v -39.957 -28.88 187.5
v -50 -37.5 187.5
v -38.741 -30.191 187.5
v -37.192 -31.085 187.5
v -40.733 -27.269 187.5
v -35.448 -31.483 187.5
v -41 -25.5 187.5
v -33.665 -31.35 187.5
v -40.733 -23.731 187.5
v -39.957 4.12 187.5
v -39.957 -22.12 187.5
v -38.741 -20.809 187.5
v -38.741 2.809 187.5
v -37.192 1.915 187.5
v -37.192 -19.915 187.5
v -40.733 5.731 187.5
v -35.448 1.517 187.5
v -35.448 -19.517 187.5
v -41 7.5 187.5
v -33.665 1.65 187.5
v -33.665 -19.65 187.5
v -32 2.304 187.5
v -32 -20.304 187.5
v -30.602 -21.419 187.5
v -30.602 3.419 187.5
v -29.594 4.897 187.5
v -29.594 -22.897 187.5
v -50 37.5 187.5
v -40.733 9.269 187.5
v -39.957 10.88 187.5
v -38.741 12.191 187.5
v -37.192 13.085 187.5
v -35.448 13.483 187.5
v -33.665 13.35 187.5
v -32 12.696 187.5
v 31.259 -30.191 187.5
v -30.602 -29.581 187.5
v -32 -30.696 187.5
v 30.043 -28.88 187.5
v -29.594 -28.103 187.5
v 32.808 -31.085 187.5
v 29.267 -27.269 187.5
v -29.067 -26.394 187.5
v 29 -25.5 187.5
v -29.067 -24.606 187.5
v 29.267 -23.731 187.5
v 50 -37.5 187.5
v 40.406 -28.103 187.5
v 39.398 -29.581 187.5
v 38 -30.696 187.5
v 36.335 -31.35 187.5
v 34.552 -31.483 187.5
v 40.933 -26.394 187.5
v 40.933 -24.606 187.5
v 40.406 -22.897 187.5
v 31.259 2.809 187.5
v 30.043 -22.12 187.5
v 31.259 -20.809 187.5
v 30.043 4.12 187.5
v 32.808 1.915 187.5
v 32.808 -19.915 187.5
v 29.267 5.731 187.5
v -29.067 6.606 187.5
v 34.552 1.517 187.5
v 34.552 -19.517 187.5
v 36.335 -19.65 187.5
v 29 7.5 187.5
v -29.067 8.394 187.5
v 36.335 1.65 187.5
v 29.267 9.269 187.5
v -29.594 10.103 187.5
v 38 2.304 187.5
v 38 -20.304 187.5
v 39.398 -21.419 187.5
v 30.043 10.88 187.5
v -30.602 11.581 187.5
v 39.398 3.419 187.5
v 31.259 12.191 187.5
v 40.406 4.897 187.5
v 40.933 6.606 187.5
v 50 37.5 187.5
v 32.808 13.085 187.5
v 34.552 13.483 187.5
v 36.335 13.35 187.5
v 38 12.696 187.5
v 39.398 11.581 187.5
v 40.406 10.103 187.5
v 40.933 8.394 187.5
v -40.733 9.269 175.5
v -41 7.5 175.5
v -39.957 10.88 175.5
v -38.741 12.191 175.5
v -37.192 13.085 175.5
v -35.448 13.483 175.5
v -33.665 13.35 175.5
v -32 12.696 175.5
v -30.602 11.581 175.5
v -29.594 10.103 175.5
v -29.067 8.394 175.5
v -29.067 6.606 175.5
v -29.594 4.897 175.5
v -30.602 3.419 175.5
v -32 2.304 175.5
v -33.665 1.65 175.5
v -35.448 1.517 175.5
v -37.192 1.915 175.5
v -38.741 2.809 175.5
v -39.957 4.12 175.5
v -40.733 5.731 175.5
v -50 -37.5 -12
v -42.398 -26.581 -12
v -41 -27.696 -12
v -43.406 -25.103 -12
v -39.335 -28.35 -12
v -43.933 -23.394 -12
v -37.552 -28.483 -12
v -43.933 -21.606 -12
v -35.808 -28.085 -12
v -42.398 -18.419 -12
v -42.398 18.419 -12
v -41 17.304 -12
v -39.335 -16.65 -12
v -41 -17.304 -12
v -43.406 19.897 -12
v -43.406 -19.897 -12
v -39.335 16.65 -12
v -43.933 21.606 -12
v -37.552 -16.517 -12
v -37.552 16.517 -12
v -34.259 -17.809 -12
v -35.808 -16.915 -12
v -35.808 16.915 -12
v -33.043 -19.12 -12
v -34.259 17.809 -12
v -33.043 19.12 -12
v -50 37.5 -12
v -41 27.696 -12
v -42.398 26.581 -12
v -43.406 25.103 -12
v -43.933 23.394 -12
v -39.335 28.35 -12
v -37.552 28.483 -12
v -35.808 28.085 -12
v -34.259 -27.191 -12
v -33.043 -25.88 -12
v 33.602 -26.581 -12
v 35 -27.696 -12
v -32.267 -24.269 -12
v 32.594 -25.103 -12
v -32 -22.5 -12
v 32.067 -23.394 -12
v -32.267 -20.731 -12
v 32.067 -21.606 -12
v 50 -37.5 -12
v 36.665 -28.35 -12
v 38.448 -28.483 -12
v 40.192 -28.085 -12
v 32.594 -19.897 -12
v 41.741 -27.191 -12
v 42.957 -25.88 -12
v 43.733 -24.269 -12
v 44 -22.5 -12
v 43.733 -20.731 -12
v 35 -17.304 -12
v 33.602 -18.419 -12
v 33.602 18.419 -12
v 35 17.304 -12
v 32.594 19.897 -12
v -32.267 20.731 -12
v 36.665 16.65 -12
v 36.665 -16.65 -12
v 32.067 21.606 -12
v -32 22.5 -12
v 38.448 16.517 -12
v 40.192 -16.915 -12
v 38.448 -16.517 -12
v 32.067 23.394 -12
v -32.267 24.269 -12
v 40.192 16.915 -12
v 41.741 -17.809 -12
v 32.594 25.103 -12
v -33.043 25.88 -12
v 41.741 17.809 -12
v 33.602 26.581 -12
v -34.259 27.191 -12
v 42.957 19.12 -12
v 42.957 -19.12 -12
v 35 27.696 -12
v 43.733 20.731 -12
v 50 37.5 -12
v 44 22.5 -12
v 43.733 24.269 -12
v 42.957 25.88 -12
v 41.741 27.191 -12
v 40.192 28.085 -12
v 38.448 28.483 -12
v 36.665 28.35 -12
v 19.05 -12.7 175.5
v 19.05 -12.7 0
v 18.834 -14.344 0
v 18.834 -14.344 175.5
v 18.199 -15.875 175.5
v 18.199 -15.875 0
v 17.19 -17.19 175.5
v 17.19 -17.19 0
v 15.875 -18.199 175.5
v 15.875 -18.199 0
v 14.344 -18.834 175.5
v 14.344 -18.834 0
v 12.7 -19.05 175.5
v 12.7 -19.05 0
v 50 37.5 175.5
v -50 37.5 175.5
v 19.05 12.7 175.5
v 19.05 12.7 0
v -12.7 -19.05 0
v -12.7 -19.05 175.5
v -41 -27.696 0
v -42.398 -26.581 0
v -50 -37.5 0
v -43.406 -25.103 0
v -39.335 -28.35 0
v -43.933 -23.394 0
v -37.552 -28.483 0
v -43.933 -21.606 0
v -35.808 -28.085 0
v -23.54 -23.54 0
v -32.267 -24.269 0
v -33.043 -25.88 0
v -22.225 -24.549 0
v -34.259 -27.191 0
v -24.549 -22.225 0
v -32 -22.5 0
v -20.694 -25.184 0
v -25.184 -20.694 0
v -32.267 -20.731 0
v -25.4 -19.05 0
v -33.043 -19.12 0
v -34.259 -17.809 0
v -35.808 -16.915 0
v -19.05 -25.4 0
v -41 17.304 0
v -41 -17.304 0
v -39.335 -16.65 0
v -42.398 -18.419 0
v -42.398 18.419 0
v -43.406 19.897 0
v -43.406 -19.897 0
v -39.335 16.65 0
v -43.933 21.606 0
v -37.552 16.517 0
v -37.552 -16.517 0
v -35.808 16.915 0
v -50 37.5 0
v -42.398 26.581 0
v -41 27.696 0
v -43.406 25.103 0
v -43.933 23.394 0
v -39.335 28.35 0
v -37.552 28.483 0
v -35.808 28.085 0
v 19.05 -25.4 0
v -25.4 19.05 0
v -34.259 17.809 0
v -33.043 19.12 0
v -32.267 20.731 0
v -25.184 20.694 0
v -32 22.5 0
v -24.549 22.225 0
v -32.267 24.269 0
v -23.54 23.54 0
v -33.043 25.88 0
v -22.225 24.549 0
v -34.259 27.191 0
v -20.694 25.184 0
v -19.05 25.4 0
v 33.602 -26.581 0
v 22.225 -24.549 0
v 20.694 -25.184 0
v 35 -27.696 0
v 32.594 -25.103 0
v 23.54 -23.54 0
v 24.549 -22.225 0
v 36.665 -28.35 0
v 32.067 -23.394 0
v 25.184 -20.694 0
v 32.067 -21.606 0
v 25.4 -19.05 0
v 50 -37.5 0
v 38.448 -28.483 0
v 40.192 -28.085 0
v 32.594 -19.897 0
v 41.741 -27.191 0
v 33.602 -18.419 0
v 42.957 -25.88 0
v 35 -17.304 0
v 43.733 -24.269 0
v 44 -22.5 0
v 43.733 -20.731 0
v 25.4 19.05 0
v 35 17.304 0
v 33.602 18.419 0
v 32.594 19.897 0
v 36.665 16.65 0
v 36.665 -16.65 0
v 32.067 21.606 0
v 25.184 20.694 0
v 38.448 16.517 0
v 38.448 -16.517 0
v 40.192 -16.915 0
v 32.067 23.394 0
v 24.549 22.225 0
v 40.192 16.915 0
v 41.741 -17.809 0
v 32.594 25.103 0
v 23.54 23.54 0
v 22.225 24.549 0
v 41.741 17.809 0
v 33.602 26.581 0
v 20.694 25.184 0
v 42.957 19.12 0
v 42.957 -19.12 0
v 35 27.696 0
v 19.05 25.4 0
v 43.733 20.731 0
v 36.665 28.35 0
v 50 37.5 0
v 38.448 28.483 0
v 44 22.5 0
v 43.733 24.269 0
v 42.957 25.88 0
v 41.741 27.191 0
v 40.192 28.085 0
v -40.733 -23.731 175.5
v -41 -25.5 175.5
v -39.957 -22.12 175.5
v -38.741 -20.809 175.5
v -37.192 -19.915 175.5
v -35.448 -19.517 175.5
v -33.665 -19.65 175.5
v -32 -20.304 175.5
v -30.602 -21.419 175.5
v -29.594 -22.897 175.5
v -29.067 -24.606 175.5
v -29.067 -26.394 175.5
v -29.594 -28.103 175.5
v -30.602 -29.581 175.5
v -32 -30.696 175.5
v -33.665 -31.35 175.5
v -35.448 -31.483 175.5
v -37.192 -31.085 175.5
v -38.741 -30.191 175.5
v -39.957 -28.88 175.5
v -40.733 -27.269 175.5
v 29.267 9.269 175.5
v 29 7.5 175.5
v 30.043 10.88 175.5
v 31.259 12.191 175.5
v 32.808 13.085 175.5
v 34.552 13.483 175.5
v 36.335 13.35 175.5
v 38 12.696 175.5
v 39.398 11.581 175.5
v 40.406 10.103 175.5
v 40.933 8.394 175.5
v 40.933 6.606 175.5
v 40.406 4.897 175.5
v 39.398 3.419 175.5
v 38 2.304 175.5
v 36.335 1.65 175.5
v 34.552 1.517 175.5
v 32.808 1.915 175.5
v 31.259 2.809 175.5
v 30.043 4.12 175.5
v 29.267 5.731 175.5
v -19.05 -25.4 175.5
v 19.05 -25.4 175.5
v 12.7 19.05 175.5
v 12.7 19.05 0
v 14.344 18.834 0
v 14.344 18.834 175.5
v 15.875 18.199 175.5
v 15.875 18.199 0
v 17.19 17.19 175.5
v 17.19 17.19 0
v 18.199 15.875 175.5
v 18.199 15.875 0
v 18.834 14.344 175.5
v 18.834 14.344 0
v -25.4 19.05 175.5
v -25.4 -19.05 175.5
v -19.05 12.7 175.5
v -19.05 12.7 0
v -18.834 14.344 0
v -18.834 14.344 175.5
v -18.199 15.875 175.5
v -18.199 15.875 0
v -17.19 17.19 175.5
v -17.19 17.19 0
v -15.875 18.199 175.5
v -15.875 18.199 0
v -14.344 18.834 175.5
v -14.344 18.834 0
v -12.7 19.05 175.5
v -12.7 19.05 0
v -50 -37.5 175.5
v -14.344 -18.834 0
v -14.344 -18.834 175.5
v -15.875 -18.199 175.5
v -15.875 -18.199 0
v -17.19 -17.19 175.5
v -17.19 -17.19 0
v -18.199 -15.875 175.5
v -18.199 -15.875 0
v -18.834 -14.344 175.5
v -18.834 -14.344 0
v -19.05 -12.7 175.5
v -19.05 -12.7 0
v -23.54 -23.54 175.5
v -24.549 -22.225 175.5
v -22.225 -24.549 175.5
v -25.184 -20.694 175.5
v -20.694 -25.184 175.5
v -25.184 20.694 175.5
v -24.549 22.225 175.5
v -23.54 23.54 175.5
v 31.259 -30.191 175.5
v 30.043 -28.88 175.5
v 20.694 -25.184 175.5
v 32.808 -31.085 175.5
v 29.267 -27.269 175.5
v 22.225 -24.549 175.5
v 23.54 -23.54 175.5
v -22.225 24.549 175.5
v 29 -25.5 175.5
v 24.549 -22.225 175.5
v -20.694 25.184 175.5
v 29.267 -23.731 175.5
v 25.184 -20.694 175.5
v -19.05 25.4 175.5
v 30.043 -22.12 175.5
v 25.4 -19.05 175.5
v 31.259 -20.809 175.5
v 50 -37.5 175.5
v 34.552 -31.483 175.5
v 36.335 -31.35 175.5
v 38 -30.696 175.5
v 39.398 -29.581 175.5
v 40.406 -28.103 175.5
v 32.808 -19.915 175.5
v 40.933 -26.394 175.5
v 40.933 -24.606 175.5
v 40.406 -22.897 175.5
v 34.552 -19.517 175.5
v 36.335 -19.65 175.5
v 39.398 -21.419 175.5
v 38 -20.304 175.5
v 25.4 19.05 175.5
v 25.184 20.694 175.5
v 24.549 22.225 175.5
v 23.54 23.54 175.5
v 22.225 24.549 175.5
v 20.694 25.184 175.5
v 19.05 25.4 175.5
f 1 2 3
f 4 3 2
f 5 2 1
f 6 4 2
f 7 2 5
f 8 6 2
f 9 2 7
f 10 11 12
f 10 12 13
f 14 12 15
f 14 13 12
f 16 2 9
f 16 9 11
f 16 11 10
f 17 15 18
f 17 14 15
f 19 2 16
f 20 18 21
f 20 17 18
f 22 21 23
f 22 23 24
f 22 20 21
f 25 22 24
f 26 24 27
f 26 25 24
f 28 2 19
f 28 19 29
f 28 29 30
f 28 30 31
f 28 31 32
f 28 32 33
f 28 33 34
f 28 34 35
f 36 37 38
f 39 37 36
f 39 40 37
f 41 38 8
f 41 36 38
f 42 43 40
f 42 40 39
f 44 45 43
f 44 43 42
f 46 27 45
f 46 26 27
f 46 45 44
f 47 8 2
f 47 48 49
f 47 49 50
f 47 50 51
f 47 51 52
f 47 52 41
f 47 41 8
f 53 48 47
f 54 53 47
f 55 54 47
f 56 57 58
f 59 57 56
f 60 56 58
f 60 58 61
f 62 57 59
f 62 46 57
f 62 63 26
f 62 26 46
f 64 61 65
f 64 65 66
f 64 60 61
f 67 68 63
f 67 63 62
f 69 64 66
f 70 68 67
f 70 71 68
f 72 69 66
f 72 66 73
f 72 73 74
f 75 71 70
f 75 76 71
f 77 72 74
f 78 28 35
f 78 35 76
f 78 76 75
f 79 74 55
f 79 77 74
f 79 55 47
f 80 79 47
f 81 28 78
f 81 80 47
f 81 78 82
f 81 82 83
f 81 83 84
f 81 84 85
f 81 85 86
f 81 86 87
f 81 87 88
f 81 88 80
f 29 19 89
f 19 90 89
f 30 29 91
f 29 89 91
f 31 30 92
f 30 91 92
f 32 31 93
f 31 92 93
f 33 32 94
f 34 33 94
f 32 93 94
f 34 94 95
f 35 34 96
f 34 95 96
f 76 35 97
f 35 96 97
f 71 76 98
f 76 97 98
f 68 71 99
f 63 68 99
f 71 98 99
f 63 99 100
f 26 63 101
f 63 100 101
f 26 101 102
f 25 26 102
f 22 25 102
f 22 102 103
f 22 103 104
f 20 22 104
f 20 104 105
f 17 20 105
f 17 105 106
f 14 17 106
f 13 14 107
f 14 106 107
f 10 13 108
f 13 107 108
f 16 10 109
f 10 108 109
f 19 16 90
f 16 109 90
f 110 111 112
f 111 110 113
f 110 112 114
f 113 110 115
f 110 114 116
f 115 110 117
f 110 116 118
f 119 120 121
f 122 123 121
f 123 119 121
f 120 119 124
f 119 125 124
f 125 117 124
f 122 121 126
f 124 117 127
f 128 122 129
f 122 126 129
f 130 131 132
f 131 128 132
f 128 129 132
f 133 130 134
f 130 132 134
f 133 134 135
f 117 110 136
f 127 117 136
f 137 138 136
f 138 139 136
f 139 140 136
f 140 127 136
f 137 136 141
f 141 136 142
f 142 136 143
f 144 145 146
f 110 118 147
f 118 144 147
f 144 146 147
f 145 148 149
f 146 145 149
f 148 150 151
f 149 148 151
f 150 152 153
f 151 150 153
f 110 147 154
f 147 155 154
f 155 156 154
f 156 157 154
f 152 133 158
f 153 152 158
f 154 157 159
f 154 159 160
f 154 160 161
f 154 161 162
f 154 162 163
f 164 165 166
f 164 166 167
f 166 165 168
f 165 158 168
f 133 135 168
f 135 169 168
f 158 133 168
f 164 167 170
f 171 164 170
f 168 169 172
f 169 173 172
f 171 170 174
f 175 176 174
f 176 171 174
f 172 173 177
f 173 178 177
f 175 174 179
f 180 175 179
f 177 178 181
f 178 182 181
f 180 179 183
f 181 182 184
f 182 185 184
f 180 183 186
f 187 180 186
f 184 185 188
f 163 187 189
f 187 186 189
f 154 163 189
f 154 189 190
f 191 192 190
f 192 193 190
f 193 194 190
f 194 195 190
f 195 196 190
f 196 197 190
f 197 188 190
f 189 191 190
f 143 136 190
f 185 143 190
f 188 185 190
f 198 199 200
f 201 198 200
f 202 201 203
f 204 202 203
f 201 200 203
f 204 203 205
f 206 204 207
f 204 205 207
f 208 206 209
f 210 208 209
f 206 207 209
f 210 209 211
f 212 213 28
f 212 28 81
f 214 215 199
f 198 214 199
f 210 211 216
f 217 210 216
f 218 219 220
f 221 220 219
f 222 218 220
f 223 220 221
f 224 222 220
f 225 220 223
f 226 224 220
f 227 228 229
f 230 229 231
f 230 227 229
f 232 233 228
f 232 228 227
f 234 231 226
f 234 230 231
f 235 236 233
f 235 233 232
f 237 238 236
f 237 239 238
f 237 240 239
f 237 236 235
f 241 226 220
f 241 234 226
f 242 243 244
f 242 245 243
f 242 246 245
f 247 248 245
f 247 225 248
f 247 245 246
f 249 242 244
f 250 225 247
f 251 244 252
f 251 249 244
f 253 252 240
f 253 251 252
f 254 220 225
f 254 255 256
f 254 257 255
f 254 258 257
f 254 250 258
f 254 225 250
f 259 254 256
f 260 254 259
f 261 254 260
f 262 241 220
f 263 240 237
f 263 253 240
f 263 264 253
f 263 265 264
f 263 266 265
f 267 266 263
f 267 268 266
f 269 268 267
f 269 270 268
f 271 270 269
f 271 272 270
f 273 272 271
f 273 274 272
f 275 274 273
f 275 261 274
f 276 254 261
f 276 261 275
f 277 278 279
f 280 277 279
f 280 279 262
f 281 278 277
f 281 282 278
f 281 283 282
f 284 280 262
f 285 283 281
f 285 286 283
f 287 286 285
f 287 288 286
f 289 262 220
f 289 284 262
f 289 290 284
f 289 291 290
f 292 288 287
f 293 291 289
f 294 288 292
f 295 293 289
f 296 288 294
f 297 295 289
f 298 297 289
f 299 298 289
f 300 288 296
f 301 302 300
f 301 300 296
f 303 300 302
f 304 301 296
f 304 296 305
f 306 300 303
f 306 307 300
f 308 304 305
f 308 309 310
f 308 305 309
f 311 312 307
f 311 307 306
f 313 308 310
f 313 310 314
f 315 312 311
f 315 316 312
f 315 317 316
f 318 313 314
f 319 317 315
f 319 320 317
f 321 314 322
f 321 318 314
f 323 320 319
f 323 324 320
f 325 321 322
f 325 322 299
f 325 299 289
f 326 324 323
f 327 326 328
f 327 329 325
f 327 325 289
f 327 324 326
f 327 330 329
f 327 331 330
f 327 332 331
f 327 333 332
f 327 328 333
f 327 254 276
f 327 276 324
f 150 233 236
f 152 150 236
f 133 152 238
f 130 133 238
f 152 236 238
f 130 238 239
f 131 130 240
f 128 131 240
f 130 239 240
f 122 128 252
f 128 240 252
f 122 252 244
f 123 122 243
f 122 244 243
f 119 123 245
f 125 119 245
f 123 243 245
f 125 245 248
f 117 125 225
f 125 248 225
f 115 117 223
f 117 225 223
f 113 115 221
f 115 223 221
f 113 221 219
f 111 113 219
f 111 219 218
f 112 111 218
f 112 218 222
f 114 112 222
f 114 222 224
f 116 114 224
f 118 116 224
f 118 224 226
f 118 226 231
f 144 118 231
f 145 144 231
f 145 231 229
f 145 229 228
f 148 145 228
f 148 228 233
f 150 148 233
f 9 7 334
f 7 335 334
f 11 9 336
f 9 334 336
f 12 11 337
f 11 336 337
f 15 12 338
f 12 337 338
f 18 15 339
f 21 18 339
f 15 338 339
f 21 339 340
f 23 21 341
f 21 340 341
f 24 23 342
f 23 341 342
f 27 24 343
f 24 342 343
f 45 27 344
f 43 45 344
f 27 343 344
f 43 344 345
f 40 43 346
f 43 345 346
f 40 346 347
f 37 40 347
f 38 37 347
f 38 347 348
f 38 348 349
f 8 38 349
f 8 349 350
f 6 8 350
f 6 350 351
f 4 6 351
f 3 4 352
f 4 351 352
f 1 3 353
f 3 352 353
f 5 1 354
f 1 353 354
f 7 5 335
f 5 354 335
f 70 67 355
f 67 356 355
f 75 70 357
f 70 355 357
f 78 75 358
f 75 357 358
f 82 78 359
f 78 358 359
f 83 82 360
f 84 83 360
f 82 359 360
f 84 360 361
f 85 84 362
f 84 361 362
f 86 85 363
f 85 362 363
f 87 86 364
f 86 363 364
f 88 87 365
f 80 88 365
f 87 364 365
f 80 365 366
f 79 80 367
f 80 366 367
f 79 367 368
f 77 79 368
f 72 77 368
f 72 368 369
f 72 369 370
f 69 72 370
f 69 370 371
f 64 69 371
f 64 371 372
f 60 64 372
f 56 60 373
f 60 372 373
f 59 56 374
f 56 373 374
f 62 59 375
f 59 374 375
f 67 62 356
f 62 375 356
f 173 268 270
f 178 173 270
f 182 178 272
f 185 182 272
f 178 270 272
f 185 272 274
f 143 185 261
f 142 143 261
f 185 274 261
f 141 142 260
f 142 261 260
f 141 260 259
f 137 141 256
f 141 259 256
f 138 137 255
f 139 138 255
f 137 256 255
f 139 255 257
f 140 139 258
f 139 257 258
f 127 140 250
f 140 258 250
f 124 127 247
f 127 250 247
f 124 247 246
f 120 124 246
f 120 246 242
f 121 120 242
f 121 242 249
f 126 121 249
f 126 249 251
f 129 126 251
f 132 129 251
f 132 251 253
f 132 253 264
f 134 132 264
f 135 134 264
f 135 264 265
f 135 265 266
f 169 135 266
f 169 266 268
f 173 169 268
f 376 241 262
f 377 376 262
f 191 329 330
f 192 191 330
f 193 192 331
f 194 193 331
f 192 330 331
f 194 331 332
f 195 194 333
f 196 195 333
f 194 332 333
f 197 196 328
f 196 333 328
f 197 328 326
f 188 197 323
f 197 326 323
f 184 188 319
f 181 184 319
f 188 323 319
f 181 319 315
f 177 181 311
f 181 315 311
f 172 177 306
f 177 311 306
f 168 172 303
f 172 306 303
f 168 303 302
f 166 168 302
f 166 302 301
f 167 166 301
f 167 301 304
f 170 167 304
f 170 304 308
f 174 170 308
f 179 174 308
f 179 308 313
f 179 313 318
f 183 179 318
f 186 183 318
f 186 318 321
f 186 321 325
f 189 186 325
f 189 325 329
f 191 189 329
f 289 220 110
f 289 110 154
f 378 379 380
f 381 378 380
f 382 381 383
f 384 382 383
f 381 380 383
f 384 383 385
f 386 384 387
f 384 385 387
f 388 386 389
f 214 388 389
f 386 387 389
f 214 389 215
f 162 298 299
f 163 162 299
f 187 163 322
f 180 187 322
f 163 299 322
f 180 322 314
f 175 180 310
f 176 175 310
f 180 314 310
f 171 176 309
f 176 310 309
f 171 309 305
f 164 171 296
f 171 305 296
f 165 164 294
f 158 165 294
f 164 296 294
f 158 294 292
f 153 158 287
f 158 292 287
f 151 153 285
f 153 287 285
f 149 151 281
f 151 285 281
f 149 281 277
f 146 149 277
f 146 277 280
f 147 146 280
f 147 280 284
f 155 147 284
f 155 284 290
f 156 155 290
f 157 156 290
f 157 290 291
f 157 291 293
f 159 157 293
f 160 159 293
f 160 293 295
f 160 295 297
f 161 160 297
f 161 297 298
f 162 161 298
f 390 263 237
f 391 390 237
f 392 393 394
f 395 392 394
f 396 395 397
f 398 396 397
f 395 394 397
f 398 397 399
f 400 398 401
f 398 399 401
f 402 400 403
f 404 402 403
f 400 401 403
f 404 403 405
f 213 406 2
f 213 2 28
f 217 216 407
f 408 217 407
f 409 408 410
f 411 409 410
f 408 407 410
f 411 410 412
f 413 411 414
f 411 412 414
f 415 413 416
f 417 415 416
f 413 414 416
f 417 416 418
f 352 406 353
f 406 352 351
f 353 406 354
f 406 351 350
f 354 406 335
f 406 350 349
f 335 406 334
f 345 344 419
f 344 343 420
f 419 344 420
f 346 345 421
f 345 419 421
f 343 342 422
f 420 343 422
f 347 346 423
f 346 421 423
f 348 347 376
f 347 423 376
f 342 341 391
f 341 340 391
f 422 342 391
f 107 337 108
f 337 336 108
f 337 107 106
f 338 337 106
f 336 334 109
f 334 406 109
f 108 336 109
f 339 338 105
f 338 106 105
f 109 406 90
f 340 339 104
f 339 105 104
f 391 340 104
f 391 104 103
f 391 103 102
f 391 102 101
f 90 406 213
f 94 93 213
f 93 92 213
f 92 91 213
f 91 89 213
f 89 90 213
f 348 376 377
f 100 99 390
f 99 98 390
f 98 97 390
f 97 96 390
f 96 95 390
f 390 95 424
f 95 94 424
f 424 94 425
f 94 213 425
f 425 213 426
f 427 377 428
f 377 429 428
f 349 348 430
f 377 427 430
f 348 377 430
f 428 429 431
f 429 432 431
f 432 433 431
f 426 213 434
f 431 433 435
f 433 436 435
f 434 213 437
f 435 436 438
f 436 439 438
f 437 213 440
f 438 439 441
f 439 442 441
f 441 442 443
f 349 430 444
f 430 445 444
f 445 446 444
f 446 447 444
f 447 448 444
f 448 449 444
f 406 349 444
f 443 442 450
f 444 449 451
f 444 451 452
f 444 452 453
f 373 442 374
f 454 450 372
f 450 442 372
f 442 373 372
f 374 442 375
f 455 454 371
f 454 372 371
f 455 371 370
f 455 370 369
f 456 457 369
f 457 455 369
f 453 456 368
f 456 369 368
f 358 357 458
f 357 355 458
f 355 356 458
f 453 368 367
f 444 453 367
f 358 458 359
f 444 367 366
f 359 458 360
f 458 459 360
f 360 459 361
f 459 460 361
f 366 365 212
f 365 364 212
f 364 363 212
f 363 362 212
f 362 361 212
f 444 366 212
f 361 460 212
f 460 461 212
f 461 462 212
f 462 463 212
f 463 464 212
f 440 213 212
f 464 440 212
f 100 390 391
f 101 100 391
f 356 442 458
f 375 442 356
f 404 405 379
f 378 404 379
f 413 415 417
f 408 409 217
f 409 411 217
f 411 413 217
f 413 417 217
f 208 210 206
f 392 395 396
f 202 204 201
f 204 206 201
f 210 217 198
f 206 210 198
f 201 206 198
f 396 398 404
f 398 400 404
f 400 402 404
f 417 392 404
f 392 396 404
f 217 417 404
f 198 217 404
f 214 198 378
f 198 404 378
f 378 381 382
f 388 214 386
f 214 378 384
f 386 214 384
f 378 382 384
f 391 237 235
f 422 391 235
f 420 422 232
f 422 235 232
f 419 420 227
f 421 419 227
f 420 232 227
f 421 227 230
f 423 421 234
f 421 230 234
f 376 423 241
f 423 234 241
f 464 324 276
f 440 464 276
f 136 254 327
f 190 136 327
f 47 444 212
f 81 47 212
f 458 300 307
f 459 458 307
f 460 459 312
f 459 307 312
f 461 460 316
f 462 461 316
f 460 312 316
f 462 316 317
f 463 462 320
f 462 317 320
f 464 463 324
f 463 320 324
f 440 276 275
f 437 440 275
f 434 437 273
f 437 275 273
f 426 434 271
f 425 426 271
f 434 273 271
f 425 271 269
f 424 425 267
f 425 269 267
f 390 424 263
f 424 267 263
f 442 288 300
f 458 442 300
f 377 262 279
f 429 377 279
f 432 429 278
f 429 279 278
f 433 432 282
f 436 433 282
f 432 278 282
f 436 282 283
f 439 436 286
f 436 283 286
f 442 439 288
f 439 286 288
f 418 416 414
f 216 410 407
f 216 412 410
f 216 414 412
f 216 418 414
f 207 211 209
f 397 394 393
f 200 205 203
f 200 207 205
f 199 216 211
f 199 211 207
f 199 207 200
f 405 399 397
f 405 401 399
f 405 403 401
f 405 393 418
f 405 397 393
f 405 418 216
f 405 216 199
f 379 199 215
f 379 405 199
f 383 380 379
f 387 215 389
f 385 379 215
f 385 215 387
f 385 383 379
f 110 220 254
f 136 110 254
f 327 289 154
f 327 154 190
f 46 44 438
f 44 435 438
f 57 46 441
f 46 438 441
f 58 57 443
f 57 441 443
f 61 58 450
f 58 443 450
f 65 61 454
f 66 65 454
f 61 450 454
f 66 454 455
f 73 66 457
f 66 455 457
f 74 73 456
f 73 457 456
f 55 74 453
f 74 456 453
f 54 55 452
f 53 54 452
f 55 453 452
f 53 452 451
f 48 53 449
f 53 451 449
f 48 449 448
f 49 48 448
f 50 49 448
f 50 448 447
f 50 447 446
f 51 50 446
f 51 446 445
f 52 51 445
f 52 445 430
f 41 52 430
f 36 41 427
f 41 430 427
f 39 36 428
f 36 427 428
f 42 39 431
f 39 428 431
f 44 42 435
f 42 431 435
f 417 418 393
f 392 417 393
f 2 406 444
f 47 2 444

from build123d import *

# Parameters (mm, degrees)
F0_W     = 100
F0_H     = 75
F1_DEPTH = 12
F3_DEPTH = 175.5
F5_W     = 100
F5_H     = 75
F6_DEPTH = 12
F7_D     = 12
F7_DEPTH = 12.001
F9_D     = 12
F9_DEPTH = 12
F9_TIP   = 3.6051637142


with BuildPart() as f1:
    # F0 (on Top) → F1 (new body)
    with BuildSketch(Plane.XY):
        Rectangle(F0_W, F0_H)
    extrude(amount=-F1_DEPTH)

    # F2 (on face) → F3 (join)
    with BuildSketch(Plane.XY):
        with BuildLine():
            Line((-19.05, -25.4), (19.05, -25.4))
            ThreePointArc((19.05, -25.4), (23.5401280605, -23.5401280605), (25.4, -19.05))
            Line((25.4, -19.05), (25.4, 19.05))
            ThreePointArc((25.4, 19.05), (23.5401280605, 23.5401280605), (19.05, 25.4))
            Line((19.05, 25.4), (-19.05, 25.4))
            ThreePointArc((-19.05, 25.4), (-23.5401280605, 23.5401280605), (-25.4, 19.05))
            Line((-25.4, 19.05), (-25.4, -19.05))
            ThreePointArc((-25.4, -19.05), (-23.5401280605, -23.5401280605), (-19.05, -25.4))
        make_face()
        with BuildLine():
            Line((-12.7, 19.05), (12.7, 19.05))
            ThreePointArc((12.7, 19.05), (17.1901280605, 17.1901280605), (19.05, 12.7))
            Line((19.05, 12.7), (19.05, -12.7))
            ThreePointArc((19.05, -12.7), (17.1901280605, -17.1901280605), (12.7, -19.05))
            Line((12.7, -19.05), (-12.7, -19.05))
            ThreePointArc((-12.7, -19.05), (-17.1901280605, -17.1901280605), (-19.05, -12.7))
            Line((-19.05, -12.7), (-19.05, 12.7))
            ThreePointArc((-19.05, 12.7), (-17.1901280605, 17.1901280605), (-12.7, 19.05))
        make_face(mode=Mode.SUBTRACT)
    extrude(amount=F3_DEPTH)

    # F5 (on face) → F6 (join)
    with BuildSketch(Plane.XY.offset(175.5)):
        Rectangle(F5_W, F5_H)
        with BuildLine():
            Line((19.05, -25.4), (-19.05, -25.4))
            ThreePointArc((-19.05, -25.4), (-23.5401280605, -23.5401280605), (-25.4, -19.05))
            Line((-25.4, -19.05), (-25.4, 19.05))
            ThreePointArc((-25.4, 19.05), (-23.5401280605, 23.5401280605), (-19.05, 25.4))
            Line((-19.05, 25.4), (19.05, 25.4))
            ThreePointArc((19.05, 25.4), (23.5401280605, 23.5401280605), (25.4, 19.05))
            Line((25.4, 19.05), (25.4, -19.05))
            ThreePointArc((25.4, -19.05), (23.5401280605, -23.5401280605), (19.05, -25.4))
        make_face(mode=Mode.SUBTRACT)
        with BuildLine():
            ThreePointArc((-25.4, -19.05), (-23.5401280605, -23.5401280605), (-19.05, -25.4))
            Line((-19.05, -25.4), (19.05, -25.4))
            ThreePointArc((19.05, -25.4), (23.5401280605, -23.5401280605), (25.4, -19.05))
            Line((25.4, -19.05), (25.4, 19.05))
            ThreePointArc((25.4, 19.05), (23.5401280605, 23.5401280605), (19.05, 25.4))
            Line((19.05, 25.4), (-19.05, 25.4))
            ThreePointArc((-19.05, 25.4), (-23.5401280605, 23.5401280605), (-25.4, 19.05))
            Line((-25.4, 19.05), (-25.4, -19.05))
        make_face()
        with BuildLine():
            Line((-19.05, -12.7), (-19.05, 12.7))
            ThreePointArc((-19.05, 12.7), (-17.1901280605, 17.1901280605), (-12.7, 19.05))
            Line((-12.7, 19.05), (12.7, 19.05))
            ThreePointArc((12.7, 19.05), (17.1901280605, 17.1901280605), (19.05, 12.7))
            Line((19.05, 12.7), (19.05, -12.7))
            ThreePointArc((19.05, -12.7), (17.1901280605, -17.1901280605), (12.7, -19.05))
            Line((12.7, -19.05), (-12.7, -19.05))
            ThreePointArc((-12.7, -19.05), (-17.1901280605, -17.1901280605), (-19.05, -12.7))
        make_face(mode=Mode.SUBTRACT)
        with BuildLine():
            ThreePointArc((-12.7, 19.05), (-17.1901280605, 17.1901280605), (-19.05, 12.7))
            Line((-19.05, 12.7), (-19.05, -12.7))
            ThreePointArc((-19.05, -12.7), (-17.1901280605, -17.1901280605), (-12.7, -19.05))
            Line((-12.7, -19.05), (12.7, -19.05))
            ThreePointArc((12.7, -19.05), (17.1901280605, -17.1901280605), (19.05, -12.7))
            Line((19.05, -12.7), (19.05, 12.7))
            ThreePointArc((19.05, 12.7), (17.1901280605, 17.1901280605), (12.7, 19.05))
            Line((12.7, 19.05), (-12.7, 19.05))
        make_face()
    extrude(amount=F6_DEPTH)

    # F7 (through all, one way)
    with BuildSketch(Plane.XY):
        with Locations((-38, 22.5), (38, 22.5), (38, -22.5), (-38, -22.5)):
            Circle(F7_D / 2)
    extrude(amount=-F7_DEPTH, mode=Mode.SUBTRACT)

    # F9
    with Locations(Plane.XY.offset(187.5)):
        with Locations((-35, 7.5), (-35, -25.5), (35, -25.5), (35, 7.5)):
            Hole(F9_D / 2, depth=F9_DEPTH)
            with Locations((0, 0, -(F9_DEPTH + F9_TIP / 2))):  # 118° drill point
                Cone(0, F9_D / 2, F9_TIP, mode=Mode.SUBTRACT)


solid = f1.part
